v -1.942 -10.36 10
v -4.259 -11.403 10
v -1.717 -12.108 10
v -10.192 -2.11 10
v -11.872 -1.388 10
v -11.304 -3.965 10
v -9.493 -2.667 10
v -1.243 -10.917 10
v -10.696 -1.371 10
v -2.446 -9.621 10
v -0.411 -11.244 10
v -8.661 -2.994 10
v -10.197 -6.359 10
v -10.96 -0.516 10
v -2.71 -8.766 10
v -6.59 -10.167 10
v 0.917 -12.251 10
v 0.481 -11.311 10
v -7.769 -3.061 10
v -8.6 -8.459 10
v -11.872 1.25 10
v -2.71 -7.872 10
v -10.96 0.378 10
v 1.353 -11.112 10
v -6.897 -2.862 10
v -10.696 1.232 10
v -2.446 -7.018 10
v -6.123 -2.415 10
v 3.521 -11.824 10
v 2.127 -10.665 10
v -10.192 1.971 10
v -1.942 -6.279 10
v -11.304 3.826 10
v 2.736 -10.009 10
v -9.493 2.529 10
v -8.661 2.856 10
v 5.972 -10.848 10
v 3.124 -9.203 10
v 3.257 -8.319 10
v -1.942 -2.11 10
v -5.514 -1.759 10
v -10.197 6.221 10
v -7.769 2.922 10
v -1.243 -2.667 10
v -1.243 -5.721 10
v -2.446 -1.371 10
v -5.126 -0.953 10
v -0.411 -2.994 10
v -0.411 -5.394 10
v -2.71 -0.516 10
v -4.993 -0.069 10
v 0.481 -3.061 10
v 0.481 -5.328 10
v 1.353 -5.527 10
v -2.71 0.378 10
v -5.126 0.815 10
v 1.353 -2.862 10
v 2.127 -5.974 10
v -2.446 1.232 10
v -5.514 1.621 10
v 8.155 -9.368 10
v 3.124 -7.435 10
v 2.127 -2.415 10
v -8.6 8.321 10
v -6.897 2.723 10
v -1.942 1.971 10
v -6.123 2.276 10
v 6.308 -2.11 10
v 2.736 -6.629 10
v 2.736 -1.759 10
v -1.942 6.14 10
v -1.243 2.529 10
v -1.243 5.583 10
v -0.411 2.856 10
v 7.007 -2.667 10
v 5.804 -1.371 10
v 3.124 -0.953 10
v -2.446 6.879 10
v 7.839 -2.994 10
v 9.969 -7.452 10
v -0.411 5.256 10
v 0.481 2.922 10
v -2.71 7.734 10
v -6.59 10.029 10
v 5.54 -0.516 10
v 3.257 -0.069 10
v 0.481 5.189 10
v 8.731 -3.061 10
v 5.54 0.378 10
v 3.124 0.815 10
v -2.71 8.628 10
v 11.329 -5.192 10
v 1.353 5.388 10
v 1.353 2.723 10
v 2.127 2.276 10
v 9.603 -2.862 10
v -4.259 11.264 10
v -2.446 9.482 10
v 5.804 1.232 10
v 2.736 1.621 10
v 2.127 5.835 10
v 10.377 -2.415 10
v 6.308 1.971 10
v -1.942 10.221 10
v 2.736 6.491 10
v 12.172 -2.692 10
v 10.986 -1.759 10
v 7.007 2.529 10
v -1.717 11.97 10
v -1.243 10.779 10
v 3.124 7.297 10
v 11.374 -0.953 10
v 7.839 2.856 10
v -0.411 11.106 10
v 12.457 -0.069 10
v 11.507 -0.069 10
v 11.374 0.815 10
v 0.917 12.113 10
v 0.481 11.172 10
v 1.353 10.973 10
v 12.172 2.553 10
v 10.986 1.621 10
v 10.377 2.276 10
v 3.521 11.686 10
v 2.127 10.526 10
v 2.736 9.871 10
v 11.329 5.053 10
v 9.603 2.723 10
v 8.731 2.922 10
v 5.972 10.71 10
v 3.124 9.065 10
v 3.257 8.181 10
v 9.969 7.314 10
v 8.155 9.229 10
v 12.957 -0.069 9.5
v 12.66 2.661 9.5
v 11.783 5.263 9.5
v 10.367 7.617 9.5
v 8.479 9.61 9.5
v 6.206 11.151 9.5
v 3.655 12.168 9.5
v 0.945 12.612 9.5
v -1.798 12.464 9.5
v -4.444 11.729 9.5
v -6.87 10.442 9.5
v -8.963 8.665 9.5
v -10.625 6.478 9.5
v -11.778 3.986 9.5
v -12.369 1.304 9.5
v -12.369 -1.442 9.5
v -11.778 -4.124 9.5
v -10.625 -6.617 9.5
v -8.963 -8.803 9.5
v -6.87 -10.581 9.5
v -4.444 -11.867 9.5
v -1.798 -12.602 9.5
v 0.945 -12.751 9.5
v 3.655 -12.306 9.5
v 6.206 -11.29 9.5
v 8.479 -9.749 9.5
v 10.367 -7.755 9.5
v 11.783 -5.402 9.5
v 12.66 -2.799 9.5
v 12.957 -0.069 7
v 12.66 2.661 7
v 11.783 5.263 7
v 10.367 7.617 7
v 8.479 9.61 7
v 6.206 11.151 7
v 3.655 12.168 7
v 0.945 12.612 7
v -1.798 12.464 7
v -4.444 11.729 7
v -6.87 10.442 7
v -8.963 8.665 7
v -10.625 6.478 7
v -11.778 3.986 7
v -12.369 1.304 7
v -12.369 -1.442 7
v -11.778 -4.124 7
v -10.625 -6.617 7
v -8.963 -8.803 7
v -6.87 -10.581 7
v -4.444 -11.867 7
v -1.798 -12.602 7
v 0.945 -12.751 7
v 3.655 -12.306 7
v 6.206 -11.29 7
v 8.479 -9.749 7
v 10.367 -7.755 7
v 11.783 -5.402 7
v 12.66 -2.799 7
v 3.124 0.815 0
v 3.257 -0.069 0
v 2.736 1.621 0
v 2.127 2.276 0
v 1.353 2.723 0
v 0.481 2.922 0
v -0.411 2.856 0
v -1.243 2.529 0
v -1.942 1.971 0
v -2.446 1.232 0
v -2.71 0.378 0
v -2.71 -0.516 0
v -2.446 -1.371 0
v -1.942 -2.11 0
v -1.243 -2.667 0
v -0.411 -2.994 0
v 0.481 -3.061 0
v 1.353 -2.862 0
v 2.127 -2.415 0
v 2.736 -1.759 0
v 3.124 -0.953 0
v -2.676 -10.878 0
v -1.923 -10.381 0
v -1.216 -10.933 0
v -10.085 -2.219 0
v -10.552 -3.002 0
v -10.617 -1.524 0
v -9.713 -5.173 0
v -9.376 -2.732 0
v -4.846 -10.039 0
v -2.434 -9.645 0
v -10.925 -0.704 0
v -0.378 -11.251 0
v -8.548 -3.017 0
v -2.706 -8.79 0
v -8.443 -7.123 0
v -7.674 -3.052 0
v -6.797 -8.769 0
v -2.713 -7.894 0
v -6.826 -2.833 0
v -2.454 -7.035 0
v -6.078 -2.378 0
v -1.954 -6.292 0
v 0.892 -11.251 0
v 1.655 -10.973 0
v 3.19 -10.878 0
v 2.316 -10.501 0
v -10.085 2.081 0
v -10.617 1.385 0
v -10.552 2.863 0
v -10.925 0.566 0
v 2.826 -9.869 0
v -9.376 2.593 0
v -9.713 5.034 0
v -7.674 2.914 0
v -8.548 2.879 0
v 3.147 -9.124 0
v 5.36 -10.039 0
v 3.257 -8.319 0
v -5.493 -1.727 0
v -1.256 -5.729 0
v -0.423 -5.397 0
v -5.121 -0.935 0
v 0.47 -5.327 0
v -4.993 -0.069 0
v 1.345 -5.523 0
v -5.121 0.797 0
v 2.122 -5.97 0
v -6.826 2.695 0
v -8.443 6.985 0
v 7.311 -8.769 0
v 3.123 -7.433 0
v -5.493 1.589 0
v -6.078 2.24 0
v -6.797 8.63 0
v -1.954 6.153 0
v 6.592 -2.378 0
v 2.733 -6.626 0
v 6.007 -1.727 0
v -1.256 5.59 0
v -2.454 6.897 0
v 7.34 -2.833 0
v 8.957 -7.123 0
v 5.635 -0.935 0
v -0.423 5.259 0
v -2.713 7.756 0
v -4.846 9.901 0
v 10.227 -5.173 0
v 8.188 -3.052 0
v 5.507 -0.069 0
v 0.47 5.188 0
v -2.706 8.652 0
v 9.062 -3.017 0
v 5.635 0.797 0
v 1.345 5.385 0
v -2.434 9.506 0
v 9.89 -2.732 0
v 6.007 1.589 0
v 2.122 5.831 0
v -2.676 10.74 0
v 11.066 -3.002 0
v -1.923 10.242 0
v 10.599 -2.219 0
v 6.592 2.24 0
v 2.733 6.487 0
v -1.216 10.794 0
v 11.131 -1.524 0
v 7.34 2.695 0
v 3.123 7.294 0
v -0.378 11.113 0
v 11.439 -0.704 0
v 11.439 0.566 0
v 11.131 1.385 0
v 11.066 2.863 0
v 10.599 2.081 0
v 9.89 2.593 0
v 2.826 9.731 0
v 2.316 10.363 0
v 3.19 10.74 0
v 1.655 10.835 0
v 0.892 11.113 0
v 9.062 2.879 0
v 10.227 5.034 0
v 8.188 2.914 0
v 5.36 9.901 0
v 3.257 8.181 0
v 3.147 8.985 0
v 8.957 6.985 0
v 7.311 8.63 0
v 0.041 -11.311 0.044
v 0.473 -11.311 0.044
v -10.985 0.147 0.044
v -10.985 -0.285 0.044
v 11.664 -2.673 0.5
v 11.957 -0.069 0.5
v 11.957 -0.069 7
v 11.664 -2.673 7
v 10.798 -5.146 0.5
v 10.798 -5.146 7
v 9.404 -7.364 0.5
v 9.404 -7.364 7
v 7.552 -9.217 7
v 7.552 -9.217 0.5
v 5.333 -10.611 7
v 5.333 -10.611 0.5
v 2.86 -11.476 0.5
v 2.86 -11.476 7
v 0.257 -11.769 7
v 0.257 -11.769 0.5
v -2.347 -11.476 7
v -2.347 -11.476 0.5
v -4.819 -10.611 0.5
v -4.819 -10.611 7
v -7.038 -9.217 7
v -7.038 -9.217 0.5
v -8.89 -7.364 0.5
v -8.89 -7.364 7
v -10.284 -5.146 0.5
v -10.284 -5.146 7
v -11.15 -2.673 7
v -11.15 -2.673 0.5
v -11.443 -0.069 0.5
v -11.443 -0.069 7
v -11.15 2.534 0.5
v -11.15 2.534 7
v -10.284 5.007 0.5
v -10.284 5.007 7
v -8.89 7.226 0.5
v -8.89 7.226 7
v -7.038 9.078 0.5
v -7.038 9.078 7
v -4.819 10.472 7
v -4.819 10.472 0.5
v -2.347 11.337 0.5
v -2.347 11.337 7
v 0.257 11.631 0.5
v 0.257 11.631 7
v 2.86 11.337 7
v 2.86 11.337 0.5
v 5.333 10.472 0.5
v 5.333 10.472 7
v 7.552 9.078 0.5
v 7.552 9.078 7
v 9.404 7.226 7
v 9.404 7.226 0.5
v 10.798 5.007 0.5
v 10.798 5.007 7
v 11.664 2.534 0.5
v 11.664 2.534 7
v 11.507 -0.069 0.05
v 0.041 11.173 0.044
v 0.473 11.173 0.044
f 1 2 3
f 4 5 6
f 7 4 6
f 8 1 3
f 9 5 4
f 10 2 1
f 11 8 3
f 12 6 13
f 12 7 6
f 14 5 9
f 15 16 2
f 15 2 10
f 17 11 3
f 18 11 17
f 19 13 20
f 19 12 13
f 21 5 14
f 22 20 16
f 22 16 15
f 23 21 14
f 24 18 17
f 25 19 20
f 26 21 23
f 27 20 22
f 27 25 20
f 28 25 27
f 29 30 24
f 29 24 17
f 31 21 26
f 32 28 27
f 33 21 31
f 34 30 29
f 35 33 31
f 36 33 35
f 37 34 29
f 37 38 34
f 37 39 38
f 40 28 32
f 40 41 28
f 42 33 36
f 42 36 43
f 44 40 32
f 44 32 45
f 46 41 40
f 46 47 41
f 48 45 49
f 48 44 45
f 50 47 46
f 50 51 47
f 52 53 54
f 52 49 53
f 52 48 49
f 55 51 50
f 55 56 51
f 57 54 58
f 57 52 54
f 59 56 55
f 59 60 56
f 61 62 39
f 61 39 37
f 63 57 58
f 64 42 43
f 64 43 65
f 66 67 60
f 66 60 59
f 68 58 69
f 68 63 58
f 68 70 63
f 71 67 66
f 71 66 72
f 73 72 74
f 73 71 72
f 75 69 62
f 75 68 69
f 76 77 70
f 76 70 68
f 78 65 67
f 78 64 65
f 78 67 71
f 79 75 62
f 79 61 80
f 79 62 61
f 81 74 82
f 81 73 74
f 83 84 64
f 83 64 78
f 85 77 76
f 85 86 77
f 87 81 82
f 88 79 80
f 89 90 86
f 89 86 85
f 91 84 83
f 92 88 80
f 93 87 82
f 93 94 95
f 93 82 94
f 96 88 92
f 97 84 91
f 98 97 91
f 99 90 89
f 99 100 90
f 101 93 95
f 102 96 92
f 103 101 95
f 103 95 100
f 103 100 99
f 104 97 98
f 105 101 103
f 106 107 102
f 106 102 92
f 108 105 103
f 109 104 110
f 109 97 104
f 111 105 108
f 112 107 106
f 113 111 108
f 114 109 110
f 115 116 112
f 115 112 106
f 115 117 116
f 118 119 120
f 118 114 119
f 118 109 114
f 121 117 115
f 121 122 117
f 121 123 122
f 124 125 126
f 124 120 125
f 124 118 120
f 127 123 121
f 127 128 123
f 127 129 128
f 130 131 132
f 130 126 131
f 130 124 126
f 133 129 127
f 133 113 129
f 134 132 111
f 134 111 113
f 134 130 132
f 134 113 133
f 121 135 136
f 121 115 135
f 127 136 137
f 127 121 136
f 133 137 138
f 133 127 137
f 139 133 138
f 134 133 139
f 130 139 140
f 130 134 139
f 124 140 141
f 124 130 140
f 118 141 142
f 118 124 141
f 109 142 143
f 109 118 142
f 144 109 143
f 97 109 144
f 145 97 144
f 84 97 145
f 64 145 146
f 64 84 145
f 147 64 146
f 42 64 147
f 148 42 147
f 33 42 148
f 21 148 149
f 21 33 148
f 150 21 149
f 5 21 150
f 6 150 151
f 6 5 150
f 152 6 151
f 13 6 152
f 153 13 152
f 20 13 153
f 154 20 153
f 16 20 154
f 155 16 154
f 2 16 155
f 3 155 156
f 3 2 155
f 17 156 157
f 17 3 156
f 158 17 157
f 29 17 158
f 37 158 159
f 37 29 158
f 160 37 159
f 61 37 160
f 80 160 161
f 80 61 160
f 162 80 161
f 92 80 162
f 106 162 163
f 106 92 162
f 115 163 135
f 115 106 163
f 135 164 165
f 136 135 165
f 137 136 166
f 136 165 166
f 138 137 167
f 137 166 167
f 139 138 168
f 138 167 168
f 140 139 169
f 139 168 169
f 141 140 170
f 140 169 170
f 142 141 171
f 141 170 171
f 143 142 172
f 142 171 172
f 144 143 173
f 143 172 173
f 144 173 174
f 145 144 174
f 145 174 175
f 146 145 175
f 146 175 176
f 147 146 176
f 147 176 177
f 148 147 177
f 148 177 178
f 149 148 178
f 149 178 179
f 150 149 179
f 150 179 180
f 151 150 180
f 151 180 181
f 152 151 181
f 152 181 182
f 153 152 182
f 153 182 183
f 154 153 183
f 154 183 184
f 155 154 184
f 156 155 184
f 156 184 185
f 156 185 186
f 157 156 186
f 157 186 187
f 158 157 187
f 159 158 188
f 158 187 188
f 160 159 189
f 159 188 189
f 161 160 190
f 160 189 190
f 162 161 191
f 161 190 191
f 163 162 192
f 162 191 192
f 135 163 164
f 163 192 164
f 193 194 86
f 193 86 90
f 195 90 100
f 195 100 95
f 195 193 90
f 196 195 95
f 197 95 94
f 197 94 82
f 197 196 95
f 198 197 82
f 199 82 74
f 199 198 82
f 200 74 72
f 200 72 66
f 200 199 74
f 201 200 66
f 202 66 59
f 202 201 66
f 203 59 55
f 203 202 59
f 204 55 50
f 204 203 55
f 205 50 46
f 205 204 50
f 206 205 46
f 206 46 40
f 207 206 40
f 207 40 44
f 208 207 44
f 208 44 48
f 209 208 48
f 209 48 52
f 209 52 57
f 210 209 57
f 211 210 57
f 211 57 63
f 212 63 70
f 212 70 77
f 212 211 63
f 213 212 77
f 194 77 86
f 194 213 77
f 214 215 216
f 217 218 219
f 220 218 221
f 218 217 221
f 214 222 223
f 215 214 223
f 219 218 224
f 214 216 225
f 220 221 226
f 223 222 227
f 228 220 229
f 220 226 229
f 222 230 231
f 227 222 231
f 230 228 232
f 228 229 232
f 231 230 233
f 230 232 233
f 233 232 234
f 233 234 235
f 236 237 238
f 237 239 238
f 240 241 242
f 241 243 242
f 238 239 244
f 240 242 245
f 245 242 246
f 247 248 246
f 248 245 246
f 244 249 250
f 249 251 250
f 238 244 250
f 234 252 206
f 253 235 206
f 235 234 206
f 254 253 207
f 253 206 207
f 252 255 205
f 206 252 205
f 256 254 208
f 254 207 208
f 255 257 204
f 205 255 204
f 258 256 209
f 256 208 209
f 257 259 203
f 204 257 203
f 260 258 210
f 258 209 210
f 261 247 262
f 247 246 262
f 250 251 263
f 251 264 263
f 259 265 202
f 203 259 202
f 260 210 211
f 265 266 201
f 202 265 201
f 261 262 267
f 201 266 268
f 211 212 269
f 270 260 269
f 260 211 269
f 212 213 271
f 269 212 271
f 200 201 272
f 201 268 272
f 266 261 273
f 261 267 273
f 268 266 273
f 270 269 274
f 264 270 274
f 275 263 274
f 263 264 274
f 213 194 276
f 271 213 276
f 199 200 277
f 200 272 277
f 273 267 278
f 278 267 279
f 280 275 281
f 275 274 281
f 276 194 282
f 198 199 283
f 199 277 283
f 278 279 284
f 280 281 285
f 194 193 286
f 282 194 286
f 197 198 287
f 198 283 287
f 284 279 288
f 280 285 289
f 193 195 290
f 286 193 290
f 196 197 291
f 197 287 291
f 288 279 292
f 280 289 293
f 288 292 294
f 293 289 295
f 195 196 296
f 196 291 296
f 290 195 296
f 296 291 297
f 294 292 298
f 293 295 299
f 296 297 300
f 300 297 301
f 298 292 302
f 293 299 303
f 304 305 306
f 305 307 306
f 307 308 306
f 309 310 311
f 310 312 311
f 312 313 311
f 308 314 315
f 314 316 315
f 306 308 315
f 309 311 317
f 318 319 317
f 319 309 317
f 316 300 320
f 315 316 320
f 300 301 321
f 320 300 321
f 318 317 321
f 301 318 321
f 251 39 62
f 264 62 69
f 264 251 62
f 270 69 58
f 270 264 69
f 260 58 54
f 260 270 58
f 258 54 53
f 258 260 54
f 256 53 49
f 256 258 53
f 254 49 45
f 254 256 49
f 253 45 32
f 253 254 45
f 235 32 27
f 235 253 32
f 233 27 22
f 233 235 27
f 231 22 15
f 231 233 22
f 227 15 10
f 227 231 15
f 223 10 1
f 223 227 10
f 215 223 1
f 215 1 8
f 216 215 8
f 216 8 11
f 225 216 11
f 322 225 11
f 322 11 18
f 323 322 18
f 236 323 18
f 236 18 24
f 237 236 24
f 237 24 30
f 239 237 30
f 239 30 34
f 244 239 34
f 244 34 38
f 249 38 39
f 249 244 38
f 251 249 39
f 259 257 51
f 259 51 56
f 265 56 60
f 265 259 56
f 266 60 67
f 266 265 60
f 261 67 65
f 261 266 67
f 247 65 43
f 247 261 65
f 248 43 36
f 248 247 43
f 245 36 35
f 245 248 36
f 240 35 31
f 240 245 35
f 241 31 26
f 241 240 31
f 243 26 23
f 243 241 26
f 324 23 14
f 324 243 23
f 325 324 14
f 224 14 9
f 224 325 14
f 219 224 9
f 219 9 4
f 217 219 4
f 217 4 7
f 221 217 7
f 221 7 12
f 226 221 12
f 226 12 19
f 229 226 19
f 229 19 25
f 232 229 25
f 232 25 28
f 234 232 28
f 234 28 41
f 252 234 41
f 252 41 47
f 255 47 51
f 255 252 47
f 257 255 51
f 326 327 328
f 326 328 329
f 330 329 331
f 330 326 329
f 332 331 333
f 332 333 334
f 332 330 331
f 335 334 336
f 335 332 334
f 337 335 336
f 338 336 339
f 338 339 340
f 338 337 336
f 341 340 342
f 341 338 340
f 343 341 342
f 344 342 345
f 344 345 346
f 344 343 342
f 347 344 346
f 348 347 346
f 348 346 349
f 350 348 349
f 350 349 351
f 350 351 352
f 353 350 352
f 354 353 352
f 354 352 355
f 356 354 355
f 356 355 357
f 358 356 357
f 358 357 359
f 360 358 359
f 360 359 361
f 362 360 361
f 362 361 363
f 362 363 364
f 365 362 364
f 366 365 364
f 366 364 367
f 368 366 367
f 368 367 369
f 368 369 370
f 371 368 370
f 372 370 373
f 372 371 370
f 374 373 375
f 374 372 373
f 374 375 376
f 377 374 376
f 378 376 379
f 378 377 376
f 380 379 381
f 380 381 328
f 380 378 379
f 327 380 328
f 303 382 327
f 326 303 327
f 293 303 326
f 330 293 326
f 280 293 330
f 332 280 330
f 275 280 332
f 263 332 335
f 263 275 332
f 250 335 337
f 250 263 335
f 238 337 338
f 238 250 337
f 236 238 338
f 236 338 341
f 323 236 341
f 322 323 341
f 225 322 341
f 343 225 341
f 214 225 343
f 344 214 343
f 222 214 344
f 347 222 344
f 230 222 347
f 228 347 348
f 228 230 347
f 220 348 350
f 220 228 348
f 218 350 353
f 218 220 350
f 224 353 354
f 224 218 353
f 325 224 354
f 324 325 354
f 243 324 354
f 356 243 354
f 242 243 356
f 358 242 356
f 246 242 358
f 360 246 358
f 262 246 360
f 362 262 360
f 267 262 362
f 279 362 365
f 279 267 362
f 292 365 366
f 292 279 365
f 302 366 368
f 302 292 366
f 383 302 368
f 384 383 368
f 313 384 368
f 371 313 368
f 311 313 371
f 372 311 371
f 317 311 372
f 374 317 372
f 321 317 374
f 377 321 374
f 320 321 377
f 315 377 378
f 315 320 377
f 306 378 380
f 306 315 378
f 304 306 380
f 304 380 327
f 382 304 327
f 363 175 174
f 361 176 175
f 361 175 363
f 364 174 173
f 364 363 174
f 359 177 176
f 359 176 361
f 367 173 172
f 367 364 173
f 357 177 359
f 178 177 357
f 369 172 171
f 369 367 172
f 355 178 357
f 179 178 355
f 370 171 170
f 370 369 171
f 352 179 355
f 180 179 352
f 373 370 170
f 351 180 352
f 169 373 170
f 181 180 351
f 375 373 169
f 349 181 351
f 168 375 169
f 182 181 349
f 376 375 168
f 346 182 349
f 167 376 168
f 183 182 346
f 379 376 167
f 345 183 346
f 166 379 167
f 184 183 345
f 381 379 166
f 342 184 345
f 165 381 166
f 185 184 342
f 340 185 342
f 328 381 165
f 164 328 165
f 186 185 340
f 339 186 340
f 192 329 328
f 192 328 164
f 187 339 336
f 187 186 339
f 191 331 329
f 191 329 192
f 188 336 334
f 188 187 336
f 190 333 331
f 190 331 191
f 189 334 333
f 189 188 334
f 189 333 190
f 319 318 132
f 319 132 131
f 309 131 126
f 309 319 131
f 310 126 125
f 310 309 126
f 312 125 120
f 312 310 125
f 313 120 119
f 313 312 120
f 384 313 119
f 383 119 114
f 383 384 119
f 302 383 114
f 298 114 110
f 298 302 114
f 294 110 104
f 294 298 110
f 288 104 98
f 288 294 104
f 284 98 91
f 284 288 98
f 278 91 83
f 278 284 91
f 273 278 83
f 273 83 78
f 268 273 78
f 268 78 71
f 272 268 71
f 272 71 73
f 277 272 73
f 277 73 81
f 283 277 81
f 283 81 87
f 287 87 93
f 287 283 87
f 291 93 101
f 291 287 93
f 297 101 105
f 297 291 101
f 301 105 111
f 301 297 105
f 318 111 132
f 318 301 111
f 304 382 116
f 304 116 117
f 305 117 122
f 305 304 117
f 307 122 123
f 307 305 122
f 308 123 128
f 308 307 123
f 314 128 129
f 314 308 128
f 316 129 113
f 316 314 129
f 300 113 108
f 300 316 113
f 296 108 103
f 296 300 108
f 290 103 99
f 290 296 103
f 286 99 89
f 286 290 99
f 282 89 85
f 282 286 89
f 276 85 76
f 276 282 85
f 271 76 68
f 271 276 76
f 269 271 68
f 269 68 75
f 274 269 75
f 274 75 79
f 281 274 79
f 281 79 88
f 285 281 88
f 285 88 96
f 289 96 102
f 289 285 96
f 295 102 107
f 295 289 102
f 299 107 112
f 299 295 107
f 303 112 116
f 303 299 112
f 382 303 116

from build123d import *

# Parameters (mm, degrees)
F0_R     = 12.7
F0_R_2   = 3
F1_DEPTH = 10
F2_R     = 12.7
F2_R_2   = 11.7
F3_DEPTH = 7


# Not quite as in the source:
# - a fillet or chamfer that OpenCascade refuses, or shapes differently, is made with other operations: its cross-section is extruded or revolved along the edge and cut away or added


with BuildPart() as f1:
    # F0 (on Top) → F1 (new body)
    with BuildSketch(Plane.XY):
        with Locations((0.256980346, -0.0691873614)):
            Circle(F0_R)
        with Locations((0.256980346, -8.3191873614)):
            Circle(F0_R_2, mode=Mode.SUBTRACT)
        with Locations((-7.993019654, -0.0691873614)):
            Circle(F0_R_2, mode=Mode.SUBTRACT)
        with Locations((0.256980346, -0.0691873614)):
            Circle(F0_R_2, mode=Mode.SUBTRACT)
        with Locations((8.506980346, -0.0691873614)):
            Circle(F0_R_2, mode=Mode.SUBTRACT)
        with Locations((0.256980346, 8.1808126386)):
            Circle(F0_R_2, mode=Mode.SUBTRACT)
    extrude(amount=F1_DEPTH)

    # F2 (on face) → F3 (cut)
    with BuildSketch(Plane(origin=(0, 0, 0), x_dir=(1, 0, 0), z_dir=(0, 0, -1))):
        with Locations((0.256980346, 0.0691873614)):
            Circle(F2_R)
        with Locations((0.256980346, 0.0691873614)):
            Circle(F2_R_2, mode=Mode.SUBTRACT)
    extrude(amount=-F3_DEPTH, mode=Mode.SUBTRACT)

    # F4: chamfer of 0.5 on 2 edges, made by hand

    # F4_s1 → F4_t2 (revolve, cut)
    with BuildSketch(Plane.XZ.offset(0.0691873614)):
        Polygon((12.956980346, 9.5), (12.456980346, 10), (12.956980346, 10), align=None)
    revolve(axis=Axis((0.256980346, -0.0691873614, 10), (0, 0, 1)), mode=Mode.SUBTRACT)

    # F4_s3 → F4_t4 (revolve, cut)
    with BuildSketch(Plane.XZ.offset(0.0691873614)):
        Polygon((11.956980346, 0.5), (11.456980346, 0), (11.956980346, 0), align=None)
    revolve(axis=Axis((0.256980346, -0.0691873614, 0), (0, 0, -1)), mode=Mode.SUBTRACT)


solid = f1.part
